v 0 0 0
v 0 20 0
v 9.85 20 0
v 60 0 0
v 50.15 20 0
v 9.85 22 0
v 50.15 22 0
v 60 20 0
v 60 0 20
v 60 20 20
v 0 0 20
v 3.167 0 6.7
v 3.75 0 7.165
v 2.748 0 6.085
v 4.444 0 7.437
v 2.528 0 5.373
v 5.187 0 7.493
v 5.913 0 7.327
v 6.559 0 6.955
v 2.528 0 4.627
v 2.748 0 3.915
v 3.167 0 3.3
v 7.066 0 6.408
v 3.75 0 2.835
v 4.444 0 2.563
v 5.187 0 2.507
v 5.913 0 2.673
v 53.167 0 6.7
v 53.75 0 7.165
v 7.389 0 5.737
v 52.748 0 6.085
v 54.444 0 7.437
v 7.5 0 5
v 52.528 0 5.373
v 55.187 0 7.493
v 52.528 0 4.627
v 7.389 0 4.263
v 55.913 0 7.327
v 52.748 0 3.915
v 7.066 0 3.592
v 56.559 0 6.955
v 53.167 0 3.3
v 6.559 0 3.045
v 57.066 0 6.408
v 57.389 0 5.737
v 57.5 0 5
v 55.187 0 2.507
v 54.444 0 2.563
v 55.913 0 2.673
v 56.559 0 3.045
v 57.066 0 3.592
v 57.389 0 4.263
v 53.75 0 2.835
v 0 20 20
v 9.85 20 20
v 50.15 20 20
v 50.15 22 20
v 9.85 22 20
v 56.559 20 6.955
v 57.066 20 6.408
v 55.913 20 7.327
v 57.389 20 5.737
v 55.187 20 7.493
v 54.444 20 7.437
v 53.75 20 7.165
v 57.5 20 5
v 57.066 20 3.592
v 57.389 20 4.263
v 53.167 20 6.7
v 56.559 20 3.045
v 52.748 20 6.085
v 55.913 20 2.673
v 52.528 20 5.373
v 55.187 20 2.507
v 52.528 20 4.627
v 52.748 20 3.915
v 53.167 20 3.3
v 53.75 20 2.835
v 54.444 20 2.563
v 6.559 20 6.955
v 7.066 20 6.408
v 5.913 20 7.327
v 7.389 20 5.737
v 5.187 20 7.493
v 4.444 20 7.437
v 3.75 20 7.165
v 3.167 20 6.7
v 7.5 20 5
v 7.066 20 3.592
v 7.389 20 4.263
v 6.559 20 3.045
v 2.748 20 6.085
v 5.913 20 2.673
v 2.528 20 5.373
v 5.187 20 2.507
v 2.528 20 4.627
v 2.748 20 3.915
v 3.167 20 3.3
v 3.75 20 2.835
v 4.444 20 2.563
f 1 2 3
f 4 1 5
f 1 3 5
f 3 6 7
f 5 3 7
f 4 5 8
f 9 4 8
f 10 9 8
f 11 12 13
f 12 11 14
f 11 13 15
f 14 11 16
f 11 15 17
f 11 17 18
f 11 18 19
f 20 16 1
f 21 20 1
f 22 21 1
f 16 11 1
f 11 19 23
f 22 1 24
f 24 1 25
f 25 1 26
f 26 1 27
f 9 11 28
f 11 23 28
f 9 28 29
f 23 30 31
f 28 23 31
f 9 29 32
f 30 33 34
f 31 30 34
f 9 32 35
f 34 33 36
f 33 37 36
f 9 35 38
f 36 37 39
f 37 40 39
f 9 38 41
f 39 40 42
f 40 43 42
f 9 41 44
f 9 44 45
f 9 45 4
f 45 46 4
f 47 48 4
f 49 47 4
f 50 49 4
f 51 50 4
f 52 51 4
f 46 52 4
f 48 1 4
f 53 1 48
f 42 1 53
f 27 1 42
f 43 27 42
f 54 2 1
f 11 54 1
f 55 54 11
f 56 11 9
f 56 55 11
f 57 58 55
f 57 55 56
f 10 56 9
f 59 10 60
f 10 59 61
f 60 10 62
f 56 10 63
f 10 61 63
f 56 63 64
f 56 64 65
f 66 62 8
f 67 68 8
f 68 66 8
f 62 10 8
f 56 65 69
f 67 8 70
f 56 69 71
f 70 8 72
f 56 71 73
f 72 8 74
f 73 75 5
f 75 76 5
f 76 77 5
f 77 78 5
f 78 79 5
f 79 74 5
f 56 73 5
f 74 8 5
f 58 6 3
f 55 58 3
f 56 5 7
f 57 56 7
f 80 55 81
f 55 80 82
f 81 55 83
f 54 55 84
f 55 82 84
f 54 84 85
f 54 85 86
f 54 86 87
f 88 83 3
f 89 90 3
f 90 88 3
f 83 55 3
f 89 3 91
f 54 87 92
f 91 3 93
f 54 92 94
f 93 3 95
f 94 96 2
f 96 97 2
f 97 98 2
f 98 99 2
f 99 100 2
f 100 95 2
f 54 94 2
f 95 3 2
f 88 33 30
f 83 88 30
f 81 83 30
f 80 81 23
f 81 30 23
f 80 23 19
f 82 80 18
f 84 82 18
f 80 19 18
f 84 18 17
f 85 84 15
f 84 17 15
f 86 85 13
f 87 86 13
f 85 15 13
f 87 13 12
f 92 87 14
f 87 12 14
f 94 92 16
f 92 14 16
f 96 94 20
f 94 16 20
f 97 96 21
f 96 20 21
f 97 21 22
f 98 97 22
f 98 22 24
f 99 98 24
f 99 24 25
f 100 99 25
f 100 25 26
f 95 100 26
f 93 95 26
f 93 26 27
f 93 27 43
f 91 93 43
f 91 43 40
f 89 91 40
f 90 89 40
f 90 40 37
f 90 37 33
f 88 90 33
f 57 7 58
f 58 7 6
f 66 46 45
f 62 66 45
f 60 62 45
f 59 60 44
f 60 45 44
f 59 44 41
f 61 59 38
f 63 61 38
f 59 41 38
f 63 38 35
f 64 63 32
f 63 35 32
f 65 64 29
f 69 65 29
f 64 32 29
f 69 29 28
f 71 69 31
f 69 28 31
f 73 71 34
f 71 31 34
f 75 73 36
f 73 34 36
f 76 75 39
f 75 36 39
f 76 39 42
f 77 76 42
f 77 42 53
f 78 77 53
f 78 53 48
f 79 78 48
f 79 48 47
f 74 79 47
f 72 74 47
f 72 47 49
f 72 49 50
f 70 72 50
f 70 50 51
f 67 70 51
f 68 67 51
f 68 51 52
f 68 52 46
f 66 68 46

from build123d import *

# Parameters (mm, degrees)
BOSS_EXTRUDE1_DEPTH = 20
SKETCH2_R           = 2.5
CUT_EXTRUDE1_DEPTH  = 23


with BuildPart() as part:
    # Sketch1 → Boss-Extrude1 (new body)
    with BuildSketch(Plane.XY):
        Polygon((0, 0), (60, 0), (60, 20), (50.15, 20), (50.15, 22), (9.85, 22), (9.85, 20), (0, 20), align=None)
    extrude(amount=BOSS_EXTRUDE1_DEPTH)

    # Sketch2 → Cut-Extrude1 (cut, through all)
    with BuildSketch(Plane.XZ):
        with Locations((55, 5)):
            Circle(SKETCH2_R)
        with Locations((5, 5)):
            Circle(SKETCH2_R)
    extrude(amount=-CUT_EXTRUDE1_DEPTH, mode=Mode.SUBTRACT)


solid = part.part
